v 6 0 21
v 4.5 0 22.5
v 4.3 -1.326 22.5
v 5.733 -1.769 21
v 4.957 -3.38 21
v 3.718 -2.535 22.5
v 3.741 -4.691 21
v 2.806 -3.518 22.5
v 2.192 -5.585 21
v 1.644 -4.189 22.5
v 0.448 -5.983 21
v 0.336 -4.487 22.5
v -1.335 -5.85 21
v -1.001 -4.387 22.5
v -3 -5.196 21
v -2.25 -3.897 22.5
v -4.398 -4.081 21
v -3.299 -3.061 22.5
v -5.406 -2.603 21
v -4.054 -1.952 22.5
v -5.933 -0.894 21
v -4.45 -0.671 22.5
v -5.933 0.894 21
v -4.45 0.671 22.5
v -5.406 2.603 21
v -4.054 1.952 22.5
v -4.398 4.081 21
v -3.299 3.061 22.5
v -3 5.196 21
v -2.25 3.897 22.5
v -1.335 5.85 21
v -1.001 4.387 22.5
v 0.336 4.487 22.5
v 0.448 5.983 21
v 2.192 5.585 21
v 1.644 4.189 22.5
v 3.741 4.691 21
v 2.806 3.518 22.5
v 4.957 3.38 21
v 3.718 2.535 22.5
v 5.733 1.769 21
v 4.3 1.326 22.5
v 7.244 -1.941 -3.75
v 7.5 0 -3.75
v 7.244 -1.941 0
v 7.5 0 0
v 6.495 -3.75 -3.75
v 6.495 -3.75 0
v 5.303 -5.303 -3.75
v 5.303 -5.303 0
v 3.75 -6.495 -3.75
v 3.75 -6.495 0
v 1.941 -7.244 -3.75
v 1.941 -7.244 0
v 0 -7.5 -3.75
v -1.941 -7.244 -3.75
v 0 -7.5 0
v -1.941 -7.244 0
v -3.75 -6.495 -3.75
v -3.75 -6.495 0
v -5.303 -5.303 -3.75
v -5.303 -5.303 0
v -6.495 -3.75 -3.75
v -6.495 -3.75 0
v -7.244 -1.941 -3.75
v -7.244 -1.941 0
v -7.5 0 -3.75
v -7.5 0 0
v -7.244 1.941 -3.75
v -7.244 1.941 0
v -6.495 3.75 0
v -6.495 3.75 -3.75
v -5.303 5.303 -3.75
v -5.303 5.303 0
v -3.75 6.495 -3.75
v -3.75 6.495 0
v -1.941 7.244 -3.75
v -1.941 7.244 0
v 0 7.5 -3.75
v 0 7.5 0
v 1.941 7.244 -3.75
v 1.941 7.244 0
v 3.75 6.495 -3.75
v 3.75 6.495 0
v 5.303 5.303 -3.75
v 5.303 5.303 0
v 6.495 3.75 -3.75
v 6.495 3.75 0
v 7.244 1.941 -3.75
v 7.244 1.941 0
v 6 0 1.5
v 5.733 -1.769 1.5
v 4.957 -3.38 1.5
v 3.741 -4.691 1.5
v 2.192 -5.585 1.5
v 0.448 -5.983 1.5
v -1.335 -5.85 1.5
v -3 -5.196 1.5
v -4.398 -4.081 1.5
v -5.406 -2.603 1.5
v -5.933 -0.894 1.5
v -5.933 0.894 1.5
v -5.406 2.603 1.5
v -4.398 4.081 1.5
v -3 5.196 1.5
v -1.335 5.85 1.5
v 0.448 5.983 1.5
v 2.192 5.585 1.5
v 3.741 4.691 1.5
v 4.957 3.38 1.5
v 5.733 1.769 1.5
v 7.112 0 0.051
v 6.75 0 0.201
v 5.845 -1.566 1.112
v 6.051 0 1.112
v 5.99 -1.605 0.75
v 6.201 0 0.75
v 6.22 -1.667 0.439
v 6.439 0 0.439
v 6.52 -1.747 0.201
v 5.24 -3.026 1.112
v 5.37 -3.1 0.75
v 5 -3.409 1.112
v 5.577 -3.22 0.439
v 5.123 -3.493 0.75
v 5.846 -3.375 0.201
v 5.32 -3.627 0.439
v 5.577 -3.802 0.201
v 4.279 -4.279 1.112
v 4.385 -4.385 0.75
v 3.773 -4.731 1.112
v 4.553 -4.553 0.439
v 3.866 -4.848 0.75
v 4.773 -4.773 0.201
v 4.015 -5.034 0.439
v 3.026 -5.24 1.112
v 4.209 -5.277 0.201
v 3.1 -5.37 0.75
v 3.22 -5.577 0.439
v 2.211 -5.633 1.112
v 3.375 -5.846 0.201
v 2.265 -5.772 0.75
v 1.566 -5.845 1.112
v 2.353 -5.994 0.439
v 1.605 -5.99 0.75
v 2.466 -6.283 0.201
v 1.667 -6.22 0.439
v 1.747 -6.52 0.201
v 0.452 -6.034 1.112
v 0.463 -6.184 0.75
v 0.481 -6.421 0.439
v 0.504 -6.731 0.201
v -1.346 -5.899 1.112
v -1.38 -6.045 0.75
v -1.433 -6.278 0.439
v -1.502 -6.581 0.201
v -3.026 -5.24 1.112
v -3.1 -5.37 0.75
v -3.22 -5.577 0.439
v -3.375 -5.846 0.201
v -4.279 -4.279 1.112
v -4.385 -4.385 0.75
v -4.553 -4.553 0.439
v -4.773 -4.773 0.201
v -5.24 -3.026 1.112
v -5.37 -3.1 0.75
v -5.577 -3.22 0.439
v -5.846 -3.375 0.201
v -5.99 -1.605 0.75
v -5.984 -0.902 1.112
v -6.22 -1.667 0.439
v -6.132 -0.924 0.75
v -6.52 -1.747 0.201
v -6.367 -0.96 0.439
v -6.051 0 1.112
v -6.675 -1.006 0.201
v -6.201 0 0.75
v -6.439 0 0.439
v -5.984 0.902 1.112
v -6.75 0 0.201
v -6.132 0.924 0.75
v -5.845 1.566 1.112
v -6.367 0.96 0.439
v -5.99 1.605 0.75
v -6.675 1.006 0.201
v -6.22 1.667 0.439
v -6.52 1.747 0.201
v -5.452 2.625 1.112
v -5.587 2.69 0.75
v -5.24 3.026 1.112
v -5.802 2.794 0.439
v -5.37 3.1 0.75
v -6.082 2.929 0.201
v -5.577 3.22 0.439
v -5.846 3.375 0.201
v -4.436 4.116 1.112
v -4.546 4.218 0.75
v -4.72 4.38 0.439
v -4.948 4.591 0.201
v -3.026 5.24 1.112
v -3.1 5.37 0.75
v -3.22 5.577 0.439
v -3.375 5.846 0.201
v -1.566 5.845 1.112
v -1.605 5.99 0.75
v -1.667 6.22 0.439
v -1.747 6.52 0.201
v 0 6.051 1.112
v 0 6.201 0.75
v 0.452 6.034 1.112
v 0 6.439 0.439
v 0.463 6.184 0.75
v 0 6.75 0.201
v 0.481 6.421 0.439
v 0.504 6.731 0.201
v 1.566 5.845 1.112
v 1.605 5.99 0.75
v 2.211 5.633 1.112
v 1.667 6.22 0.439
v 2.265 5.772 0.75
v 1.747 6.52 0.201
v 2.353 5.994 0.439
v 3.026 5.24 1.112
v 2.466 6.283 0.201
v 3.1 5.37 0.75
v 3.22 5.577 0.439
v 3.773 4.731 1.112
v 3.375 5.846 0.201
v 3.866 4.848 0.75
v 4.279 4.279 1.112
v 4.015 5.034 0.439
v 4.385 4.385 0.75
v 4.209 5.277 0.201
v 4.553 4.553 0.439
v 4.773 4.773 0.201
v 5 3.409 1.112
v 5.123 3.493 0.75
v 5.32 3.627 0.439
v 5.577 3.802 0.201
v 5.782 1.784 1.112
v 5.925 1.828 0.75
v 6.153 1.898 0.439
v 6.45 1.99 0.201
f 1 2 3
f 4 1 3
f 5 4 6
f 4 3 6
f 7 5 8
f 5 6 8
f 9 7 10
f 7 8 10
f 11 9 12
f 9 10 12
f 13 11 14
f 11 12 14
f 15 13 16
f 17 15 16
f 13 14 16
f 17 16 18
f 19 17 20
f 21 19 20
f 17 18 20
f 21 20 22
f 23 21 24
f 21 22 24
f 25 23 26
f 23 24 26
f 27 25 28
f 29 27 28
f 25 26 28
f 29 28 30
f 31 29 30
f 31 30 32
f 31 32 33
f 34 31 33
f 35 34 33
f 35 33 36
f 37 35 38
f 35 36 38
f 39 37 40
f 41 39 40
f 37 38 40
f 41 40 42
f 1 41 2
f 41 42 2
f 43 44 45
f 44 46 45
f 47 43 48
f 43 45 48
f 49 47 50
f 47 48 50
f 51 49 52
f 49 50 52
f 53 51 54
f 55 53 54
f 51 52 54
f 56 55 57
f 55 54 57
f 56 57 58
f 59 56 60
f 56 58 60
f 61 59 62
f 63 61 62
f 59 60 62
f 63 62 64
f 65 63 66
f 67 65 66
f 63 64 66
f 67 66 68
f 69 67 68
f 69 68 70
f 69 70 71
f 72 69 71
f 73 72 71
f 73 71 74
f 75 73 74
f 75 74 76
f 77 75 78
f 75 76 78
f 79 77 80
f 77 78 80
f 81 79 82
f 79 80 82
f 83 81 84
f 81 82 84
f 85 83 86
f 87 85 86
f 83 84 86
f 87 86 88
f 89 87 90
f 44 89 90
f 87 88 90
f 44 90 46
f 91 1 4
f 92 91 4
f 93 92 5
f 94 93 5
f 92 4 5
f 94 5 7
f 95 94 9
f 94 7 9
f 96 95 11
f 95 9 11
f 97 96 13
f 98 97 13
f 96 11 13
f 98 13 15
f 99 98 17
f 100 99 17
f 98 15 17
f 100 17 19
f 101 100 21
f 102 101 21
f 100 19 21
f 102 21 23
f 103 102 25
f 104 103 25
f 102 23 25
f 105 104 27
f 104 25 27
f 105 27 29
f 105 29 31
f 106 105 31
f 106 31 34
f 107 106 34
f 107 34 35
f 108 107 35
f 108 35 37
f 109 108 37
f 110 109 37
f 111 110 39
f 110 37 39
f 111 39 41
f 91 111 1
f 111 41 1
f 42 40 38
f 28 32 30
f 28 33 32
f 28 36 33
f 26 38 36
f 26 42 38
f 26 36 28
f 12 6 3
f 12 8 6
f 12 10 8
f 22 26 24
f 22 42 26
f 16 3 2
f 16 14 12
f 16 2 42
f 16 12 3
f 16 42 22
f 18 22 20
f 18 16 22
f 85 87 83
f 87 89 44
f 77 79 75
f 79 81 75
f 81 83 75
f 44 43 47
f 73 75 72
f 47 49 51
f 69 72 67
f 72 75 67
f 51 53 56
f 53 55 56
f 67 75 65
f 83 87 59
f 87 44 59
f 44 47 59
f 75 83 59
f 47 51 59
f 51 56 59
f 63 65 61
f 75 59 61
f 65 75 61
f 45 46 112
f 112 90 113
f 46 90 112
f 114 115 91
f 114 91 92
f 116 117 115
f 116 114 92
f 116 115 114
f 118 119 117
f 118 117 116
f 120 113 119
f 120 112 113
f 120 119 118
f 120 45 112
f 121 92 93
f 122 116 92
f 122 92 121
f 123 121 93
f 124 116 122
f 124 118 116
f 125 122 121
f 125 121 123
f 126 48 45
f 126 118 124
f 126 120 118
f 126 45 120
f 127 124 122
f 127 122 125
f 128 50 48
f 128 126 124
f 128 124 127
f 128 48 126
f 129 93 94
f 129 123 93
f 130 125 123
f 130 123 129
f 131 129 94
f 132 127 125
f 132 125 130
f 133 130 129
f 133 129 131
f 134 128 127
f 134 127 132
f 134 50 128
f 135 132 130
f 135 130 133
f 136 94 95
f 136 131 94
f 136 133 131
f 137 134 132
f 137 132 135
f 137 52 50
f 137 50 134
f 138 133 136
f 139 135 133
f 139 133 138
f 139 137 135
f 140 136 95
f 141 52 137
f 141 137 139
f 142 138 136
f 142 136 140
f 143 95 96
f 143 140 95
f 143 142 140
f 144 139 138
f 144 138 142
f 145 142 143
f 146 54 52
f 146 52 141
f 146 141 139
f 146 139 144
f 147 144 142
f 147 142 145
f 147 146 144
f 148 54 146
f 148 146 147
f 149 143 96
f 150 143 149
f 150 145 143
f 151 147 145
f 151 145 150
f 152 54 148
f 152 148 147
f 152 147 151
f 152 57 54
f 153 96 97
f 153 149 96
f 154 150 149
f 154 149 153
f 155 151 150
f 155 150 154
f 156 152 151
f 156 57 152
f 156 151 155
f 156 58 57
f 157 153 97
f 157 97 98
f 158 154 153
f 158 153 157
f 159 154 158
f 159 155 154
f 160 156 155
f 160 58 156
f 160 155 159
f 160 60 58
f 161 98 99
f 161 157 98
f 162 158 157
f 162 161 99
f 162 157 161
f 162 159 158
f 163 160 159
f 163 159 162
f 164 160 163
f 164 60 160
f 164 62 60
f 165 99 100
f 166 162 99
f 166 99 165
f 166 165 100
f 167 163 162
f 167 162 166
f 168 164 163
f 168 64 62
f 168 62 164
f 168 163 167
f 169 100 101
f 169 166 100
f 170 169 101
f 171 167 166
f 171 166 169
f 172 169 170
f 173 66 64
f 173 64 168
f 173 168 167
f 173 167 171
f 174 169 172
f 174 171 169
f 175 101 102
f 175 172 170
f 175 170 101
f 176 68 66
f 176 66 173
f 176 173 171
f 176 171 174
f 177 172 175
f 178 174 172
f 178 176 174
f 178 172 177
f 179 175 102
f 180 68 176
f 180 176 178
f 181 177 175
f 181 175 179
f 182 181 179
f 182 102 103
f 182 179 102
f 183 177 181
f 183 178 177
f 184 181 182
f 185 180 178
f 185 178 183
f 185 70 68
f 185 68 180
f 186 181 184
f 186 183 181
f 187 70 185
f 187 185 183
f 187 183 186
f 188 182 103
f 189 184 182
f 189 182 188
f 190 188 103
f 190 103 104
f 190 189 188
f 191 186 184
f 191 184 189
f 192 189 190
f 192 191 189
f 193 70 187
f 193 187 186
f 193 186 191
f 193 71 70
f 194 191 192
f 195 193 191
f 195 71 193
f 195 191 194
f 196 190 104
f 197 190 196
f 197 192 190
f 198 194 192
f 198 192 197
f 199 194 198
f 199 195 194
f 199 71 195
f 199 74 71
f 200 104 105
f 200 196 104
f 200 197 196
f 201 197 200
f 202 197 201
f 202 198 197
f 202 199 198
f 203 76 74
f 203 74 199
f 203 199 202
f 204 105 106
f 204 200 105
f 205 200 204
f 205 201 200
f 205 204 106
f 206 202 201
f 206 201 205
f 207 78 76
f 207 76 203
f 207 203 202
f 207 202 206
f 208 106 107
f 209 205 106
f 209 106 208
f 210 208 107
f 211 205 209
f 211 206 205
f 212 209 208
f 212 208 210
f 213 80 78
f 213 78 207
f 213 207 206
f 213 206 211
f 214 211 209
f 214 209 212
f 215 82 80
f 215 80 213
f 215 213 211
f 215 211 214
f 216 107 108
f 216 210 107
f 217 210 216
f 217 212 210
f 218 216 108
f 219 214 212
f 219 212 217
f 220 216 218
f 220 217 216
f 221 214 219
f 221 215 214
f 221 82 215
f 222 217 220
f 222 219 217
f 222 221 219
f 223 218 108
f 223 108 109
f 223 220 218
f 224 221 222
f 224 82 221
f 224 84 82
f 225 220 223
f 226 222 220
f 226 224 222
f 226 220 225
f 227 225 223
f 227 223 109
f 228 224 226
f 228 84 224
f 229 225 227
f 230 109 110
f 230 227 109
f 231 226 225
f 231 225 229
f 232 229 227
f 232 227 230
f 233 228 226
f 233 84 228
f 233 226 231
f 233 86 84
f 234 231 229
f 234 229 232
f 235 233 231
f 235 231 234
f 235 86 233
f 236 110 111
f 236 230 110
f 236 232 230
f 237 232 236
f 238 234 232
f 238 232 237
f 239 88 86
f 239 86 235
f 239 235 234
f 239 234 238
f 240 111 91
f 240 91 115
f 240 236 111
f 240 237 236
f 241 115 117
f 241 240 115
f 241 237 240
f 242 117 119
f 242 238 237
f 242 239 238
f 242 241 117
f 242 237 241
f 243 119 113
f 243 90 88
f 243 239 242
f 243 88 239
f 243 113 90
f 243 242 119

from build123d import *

# Parameters (mm, degrees)
F0_W    = 6
F0_H    = 22.5
F2_SIZE = 1.5
F3_R    = 1.49999


# Not quite as in the source:
# - a fillet or chamfer is up to 0.001 mm smaller than in the source, because OpenCascade refuses the exact size


with BuildPart() as f1:
    # F0 (on Front) → F1 (revolve)
    with BuildSketch(Plane.XZ):
        with Locations((3, 11.25)):
            Rectangle(F0_W, F0_H)
        Polygon((6, 0), (0, 0), (0, -3.75), (7.5, -3.75), (7.5, 0), align=None)
    revolve(axis=Axis((0, 0, 8.5798527999), (0, 0, -1)))

    # F2
    f2_edges = [f1.edges().sort_by_distance(p)[0] for p in [
        (-6, 0, 22.5),
    ]]
    chamfer(f2_edges, length=F2_SIZE)

    # F3 (radius 1.5 in the source; OpenCascade refuses exactly that, so slightly less here)
    f3_edges = [f1.edges().sort_by_distance(p)[0] for p in [
        (-6, 0, 0),
    ]]
    fillet(f3_edges, radius=F3_R)


solid = f1.part
